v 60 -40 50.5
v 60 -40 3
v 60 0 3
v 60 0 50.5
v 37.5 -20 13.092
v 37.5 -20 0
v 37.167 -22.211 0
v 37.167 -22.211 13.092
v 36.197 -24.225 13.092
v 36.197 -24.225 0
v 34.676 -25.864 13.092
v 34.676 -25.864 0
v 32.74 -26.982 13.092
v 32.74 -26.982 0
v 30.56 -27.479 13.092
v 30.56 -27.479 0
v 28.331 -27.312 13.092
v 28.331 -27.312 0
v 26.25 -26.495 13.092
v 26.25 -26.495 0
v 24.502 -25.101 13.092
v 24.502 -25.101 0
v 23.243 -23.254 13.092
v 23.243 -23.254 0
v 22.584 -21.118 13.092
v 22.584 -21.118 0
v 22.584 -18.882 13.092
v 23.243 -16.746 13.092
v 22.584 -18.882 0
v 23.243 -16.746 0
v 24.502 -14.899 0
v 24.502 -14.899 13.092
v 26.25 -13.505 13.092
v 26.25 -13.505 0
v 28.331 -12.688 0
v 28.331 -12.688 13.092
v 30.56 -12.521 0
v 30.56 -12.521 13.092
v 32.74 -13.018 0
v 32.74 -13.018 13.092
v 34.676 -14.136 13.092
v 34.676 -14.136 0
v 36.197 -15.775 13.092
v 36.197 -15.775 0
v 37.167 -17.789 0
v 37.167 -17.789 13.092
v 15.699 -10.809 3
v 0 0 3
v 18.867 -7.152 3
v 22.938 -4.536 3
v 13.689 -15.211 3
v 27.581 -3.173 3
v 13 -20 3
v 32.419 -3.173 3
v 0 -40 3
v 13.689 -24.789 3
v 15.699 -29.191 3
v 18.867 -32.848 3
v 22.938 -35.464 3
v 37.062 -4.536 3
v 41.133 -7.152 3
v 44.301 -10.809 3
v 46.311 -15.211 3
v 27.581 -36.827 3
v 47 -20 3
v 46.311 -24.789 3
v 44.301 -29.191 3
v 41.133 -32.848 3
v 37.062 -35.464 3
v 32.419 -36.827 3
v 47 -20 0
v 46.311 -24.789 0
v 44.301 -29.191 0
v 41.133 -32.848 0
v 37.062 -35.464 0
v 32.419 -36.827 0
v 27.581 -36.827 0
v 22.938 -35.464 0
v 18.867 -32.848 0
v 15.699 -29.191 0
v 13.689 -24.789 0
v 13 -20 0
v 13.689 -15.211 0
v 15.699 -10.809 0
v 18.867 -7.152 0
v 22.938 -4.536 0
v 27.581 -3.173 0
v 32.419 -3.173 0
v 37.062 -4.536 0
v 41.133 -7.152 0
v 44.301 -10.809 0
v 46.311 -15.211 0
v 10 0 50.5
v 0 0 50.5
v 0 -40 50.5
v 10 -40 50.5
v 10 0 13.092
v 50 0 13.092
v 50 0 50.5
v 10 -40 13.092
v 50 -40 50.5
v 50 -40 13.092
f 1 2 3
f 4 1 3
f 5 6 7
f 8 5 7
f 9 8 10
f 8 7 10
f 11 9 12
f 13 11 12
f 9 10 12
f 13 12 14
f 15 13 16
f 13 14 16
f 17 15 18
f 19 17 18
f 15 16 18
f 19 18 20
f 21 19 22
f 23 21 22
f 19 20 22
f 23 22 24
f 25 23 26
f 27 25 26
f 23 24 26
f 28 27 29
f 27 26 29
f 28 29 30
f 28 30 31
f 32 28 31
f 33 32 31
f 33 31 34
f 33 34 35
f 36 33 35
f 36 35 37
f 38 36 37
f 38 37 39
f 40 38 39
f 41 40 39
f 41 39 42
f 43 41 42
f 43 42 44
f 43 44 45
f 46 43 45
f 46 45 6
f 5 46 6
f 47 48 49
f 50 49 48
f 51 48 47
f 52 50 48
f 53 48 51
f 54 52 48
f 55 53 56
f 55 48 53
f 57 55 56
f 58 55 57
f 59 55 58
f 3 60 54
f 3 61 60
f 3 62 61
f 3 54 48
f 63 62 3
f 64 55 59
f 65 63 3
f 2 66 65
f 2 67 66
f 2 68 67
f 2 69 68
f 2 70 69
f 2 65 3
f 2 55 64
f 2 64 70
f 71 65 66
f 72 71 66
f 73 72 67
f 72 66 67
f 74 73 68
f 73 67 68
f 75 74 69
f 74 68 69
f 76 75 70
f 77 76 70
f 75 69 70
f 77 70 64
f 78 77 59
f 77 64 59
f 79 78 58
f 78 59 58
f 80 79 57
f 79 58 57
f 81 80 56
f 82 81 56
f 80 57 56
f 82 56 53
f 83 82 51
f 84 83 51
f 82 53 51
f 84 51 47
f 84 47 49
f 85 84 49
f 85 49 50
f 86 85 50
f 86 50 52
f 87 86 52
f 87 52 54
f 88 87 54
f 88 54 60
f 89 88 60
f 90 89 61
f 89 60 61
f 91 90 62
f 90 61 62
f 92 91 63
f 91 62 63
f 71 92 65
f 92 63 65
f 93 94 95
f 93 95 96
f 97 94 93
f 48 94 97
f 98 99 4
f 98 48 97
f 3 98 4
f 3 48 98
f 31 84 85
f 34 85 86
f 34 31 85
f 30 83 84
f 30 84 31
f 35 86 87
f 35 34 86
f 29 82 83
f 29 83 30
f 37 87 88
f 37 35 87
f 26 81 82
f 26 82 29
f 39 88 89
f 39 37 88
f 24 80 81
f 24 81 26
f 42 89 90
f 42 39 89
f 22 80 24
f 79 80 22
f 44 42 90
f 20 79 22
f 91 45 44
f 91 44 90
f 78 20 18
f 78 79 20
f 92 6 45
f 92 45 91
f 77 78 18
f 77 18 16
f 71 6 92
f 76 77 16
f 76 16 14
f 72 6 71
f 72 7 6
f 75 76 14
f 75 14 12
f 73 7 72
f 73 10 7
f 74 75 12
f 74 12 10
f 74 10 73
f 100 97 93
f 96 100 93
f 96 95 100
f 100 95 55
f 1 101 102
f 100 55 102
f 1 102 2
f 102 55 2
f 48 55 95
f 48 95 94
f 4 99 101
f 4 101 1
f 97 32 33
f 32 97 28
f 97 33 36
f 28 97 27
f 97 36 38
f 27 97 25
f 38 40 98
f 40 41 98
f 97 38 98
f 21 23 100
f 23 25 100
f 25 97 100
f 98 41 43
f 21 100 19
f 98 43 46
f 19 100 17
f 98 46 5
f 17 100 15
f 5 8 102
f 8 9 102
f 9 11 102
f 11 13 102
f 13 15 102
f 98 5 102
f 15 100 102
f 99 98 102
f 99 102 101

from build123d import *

# Parameters (mm, degrees)
F0_W     = 60
F0_H     = 40
F1_DEPTH = 50.5
F2_W     = 60
F2_H     = 3
F3_DEPTH = 40.001
F4_R     = 17
F5_DEPTH = 3
F6_W     = 40
F6_H     = 37.407568
F7_DEPTH = 40.001
F8_R     = 7.5
F9_DEPTH = 50.501


with BuildPart() as f1:
    # F0 (on Top) → F1 (new body)
    with BuildSketch(Plane.XY):
        with Locations((30, -20)):
            Rectangle(F0_W, F0_H)
    extrude(amount=F1_DEPTH)

    # F2 (on face) → F3 (cut, through all)
    with BuildSketch(Plane.XZ.offset(40)):
        with Locations((30, 1.5)):
            Rectangle(F2_W, F2_H)
    extrude(amount=-F3_DEPTH, mode=Mode.SUBTRACT)

    # F4 (on face) → F5 (join)
    with BuildSketch(Plane(origin=(0, 0, 3), x_dir=(1, 0, 0), z_dir=(0, 0, -1))):
        with Locations((30, 20)):
            Circle(F4_R)
    extrude(amount=F5_DEPTH)

    # F6 (on face) → F7 (cut, through all)
    with BuildSketch(Plane.XZ.offset(40)):
        with Locations((30, 31.796216)):
            Rectangle(F6_W, F6_H)
    extrude(amount=-F7_DEPTH, mode=Mode.SUBTRACT)

    # F8 (on face) → F9 (cut, through all)
    with BuildSketch(Plane(origin=(0, 0, 0), x_dir=(1, 0, 0), z_dir=(0, 0, -1))):
        with Locations((30, 20)):
            Circle(F8_R)
    extrude(amount=-F9_DEPTH, mode=Mode.SUBTRACT)


solid = f1.part
